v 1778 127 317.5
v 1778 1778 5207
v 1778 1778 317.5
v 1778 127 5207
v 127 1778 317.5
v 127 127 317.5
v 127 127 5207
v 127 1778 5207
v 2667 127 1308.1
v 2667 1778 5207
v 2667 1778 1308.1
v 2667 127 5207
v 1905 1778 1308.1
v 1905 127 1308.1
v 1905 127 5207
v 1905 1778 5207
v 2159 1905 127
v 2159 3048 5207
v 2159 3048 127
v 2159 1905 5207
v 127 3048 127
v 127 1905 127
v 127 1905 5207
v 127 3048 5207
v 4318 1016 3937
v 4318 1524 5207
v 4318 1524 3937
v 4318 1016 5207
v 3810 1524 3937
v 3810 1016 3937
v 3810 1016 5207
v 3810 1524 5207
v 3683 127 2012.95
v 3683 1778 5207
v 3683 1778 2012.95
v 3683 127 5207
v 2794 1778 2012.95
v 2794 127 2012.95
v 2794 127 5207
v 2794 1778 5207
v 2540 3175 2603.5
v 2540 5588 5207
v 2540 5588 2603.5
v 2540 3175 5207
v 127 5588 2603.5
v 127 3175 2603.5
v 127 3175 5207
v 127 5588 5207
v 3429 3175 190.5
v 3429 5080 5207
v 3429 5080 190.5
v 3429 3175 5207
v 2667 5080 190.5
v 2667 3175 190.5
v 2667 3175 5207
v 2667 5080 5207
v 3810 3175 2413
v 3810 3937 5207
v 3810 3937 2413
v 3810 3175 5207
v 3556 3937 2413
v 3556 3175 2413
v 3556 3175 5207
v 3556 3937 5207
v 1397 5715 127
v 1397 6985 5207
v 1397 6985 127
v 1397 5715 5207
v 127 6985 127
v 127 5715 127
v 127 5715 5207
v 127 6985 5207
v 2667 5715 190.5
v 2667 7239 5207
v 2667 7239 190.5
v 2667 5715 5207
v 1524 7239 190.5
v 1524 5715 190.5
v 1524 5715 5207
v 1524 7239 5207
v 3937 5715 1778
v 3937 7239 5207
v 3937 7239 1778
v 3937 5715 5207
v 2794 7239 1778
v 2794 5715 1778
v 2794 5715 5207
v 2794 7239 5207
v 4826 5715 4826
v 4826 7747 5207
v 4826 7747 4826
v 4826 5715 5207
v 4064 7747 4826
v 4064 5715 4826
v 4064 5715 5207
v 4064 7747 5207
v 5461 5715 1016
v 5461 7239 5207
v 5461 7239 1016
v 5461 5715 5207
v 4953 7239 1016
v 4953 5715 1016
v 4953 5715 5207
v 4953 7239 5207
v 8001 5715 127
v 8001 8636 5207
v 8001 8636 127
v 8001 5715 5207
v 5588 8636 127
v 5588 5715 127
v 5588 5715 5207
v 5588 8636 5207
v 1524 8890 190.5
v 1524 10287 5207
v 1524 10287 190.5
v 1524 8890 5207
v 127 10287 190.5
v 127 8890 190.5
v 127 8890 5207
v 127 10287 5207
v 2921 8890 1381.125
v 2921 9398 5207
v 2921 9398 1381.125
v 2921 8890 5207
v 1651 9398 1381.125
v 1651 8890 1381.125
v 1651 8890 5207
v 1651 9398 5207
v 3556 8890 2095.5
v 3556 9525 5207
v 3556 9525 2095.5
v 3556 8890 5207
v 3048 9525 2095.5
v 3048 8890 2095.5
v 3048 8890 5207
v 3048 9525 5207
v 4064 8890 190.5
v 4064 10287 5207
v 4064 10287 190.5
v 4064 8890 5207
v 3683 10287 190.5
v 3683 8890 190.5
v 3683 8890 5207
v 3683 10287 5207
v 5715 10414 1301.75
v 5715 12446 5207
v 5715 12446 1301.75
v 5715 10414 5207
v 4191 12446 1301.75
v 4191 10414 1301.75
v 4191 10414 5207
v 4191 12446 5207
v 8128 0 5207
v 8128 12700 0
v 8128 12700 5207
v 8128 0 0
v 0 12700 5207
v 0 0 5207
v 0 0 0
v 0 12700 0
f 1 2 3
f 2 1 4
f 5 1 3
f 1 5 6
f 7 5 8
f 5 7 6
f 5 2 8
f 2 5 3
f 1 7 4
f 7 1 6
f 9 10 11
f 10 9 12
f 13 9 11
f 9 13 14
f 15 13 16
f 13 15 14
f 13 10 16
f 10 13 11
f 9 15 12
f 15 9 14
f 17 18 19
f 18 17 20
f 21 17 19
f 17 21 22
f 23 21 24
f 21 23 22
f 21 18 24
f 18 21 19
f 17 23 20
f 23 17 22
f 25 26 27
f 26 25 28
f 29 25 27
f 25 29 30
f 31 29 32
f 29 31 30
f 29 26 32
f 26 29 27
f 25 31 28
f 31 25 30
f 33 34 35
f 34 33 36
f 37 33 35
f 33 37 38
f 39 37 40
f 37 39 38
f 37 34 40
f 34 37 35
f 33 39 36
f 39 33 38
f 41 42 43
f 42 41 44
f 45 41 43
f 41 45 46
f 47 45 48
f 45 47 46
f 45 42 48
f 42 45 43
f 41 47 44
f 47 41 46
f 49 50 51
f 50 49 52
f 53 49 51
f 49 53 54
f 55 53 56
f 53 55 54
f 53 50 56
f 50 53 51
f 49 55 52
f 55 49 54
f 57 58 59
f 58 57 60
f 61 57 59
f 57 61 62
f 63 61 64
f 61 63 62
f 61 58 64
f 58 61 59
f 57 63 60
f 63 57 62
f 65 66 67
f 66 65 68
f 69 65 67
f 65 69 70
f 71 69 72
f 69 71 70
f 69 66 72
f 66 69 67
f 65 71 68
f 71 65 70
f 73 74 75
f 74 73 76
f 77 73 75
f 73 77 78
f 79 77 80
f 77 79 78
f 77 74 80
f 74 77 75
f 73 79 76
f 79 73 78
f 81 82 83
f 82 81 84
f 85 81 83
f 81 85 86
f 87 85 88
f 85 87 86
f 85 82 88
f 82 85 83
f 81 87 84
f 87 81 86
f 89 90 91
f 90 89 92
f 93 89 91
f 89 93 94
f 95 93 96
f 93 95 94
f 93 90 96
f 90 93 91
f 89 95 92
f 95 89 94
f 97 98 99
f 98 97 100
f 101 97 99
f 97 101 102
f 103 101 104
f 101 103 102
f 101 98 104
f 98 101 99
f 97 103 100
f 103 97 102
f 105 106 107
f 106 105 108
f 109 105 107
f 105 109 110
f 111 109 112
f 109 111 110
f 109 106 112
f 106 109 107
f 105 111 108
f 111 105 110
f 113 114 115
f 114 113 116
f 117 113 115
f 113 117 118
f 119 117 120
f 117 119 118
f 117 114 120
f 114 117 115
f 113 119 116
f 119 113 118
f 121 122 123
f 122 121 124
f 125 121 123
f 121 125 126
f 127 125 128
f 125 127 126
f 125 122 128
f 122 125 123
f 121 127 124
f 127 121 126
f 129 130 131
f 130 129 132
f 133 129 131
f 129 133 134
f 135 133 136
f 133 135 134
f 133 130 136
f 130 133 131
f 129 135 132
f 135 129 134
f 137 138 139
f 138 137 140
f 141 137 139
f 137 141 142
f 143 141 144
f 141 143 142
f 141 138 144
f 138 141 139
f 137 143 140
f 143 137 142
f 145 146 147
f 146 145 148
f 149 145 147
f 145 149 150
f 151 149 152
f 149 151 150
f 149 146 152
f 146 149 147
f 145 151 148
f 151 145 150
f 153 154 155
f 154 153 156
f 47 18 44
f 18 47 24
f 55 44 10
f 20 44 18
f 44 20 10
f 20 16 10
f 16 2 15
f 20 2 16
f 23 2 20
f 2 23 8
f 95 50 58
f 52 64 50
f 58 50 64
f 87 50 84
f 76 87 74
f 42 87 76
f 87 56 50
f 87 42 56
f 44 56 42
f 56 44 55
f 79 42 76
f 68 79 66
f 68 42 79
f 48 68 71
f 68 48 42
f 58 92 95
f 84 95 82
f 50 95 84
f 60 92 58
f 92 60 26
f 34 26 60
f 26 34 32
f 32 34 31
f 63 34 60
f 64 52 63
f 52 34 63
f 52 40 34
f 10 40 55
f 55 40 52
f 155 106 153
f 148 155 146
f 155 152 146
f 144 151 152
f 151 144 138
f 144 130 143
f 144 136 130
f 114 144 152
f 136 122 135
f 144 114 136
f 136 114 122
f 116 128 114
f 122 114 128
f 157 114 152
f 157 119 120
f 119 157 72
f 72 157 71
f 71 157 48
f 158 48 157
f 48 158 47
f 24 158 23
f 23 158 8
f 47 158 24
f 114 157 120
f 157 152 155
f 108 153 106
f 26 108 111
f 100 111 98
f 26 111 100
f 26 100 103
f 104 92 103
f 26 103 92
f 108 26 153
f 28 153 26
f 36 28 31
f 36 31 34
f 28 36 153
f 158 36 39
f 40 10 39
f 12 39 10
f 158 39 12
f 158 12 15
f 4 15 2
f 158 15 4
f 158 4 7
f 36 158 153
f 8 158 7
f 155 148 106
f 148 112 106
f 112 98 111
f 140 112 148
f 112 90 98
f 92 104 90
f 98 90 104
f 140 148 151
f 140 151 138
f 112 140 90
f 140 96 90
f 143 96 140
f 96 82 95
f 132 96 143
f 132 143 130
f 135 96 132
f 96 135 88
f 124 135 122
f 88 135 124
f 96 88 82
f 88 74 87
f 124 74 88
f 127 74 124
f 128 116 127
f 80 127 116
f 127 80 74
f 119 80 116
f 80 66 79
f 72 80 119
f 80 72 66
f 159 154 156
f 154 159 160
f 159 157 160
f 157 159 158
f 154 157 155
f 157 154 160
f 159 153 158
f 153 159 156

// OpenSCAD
// Bathroom Organizer
// Internal units: 1/5 inch (0.2")
// scale(5) → inches
// scale(25.4) → mm for slicer

floor_t  = 1;      // solid floor thickness (units)
cavity_h = 40;     // slot cavity depth
tray_h   = cavity_h + floor_t;
stickout = 3;      // desired protrusion above rim
wall     = 1;      // wall thickness

// ---------- Heights ----------

// Pump bottles: top flush with rim
raise_okeefe   = cavity_h - 38.5;
raise_cerave   = cavity_h - 30.7;
raise_cleanser = cavity_h - 40.0;

// Non-pump items
raise_deo       = max(0, cavity_h + stickout - 28.15);
raise_comb      = max(0, cavity_h + stickout - 25);
raise_chapstick = max(0, cavity_h + stickout - 13);
raise_brush     = max(0, cavity_h + stickout - 42.5);

// Cantu: 3u below rim
raise_cantu = max(0, (cavity_h - 3) - 17.5);

// Dental
raise_toothbrush = max(0, cavity_h + stickout - 56.25);
raise_toothpaste = max(0, cavity_h + stickout - 42.5);
raise_nightpaste = max(0, cavity_h + stickout - 30);
raise_nightguard = max(0, cavity_h + stickout - 6);
raise_scraper    = max(0, cavity_h + stickout - 36);
raise_mouthwash  = max(0, cavity_h - 56.25); // flush

// Shaving
raise_gel        = max(0, cavity_h + stickout - 42.5);
raise_aftershave = max(0, cavity_h + stickout - 33.125);
raise_razor      = max(0, cavity_h + stickout - 27.5);
raise_shavette   = max(0, cavity_h + stickout - 42.5);
raise_trimmer    = max(0, cavity_h + stickout - 33.75);

chamfer = 1.5;

// ---------- Slot Module ----------

module slot(x, y, w, d, raise) {
    translate([x, y, floor_t + raise])
        cube([w, d, tray_h - floor_t - raise + 1]);

    if (chamfer > 0) {
        translate([x, y, tray_h - chamfer])
            rotate([-45, 0, 0])
                cube([w,
                      chamfer * sqrt(2),
                      chamfer * sqrt(2)]);
    }
}

// ---------- Overall Dimensions ----------
// 64u = 12.8"
// 100u = 20"
W = 64;
D = 100;

scale(25.4)
scale(5)
difference() {

    cube([W, D, tray_h]);

    // =========================================================
    // EXISTING ITEMS
    // =========================================================

    // --- Skin care (front-left) ---
    slot( 1,  1, 13, 13, raise_okeefe);     // O'Keefe pump
    slot(15,  1,  6, 13, raise_cerave);     // CeraVe pump
    slot( 1, 15, 16,  9, raise_cleanser);   // Cleanser
    slot(30,  8,  4,  4, raise_chapstick);  // Chapstick

    // --- Body ---
    slot(22,  1,  7, 13, raise_deo);        // Speed Stick

    // --- Hair ---
    slot( 1, 25, 19, 19, raise_cantu);      // Cantu
    slot(21, 25,  6, 15, raise_brush);      // Brush
    slot(28, 25,  2,  6, raise_comb);       // Comb

    // =========================================================
    // DENTAL
    // =========================================================

    slot( 1, 45, 10, 10, raise_toothbrush); // Toothbrush charger
    slot(12, 45,  9, 12, raise_toothpaste); // Toothpaste
    slot(22, 45,  9, 12, raise_nightpaste); // Night toothpaste
    slot(32, 45,  6, 16, raise_nightguard); // Night guard
    slot(39, 45,  4, 12, raise_scraper);    // Tongue scraper
    slot(44, 45, 19, 23, raise_mouthwash);  // Mouthwash

    // =========================================================
    // SHAVING
    // =========================================================

    slot( 1, 70, 11, 11, raise_gel);        // Shaving gel
    slot(13, 70, 10,  4, raise_aftershave); // Aftershave
    slot(24, 70,  4,  5, raise_razor);      // Clip razor
    slot(29, 70,  3, 11, raise_shavette);   // Shavette

    // Trimmer charger base against back wall
    slot(33, 82, 12, 16, raise_trimmer);    // Trimmer
}
